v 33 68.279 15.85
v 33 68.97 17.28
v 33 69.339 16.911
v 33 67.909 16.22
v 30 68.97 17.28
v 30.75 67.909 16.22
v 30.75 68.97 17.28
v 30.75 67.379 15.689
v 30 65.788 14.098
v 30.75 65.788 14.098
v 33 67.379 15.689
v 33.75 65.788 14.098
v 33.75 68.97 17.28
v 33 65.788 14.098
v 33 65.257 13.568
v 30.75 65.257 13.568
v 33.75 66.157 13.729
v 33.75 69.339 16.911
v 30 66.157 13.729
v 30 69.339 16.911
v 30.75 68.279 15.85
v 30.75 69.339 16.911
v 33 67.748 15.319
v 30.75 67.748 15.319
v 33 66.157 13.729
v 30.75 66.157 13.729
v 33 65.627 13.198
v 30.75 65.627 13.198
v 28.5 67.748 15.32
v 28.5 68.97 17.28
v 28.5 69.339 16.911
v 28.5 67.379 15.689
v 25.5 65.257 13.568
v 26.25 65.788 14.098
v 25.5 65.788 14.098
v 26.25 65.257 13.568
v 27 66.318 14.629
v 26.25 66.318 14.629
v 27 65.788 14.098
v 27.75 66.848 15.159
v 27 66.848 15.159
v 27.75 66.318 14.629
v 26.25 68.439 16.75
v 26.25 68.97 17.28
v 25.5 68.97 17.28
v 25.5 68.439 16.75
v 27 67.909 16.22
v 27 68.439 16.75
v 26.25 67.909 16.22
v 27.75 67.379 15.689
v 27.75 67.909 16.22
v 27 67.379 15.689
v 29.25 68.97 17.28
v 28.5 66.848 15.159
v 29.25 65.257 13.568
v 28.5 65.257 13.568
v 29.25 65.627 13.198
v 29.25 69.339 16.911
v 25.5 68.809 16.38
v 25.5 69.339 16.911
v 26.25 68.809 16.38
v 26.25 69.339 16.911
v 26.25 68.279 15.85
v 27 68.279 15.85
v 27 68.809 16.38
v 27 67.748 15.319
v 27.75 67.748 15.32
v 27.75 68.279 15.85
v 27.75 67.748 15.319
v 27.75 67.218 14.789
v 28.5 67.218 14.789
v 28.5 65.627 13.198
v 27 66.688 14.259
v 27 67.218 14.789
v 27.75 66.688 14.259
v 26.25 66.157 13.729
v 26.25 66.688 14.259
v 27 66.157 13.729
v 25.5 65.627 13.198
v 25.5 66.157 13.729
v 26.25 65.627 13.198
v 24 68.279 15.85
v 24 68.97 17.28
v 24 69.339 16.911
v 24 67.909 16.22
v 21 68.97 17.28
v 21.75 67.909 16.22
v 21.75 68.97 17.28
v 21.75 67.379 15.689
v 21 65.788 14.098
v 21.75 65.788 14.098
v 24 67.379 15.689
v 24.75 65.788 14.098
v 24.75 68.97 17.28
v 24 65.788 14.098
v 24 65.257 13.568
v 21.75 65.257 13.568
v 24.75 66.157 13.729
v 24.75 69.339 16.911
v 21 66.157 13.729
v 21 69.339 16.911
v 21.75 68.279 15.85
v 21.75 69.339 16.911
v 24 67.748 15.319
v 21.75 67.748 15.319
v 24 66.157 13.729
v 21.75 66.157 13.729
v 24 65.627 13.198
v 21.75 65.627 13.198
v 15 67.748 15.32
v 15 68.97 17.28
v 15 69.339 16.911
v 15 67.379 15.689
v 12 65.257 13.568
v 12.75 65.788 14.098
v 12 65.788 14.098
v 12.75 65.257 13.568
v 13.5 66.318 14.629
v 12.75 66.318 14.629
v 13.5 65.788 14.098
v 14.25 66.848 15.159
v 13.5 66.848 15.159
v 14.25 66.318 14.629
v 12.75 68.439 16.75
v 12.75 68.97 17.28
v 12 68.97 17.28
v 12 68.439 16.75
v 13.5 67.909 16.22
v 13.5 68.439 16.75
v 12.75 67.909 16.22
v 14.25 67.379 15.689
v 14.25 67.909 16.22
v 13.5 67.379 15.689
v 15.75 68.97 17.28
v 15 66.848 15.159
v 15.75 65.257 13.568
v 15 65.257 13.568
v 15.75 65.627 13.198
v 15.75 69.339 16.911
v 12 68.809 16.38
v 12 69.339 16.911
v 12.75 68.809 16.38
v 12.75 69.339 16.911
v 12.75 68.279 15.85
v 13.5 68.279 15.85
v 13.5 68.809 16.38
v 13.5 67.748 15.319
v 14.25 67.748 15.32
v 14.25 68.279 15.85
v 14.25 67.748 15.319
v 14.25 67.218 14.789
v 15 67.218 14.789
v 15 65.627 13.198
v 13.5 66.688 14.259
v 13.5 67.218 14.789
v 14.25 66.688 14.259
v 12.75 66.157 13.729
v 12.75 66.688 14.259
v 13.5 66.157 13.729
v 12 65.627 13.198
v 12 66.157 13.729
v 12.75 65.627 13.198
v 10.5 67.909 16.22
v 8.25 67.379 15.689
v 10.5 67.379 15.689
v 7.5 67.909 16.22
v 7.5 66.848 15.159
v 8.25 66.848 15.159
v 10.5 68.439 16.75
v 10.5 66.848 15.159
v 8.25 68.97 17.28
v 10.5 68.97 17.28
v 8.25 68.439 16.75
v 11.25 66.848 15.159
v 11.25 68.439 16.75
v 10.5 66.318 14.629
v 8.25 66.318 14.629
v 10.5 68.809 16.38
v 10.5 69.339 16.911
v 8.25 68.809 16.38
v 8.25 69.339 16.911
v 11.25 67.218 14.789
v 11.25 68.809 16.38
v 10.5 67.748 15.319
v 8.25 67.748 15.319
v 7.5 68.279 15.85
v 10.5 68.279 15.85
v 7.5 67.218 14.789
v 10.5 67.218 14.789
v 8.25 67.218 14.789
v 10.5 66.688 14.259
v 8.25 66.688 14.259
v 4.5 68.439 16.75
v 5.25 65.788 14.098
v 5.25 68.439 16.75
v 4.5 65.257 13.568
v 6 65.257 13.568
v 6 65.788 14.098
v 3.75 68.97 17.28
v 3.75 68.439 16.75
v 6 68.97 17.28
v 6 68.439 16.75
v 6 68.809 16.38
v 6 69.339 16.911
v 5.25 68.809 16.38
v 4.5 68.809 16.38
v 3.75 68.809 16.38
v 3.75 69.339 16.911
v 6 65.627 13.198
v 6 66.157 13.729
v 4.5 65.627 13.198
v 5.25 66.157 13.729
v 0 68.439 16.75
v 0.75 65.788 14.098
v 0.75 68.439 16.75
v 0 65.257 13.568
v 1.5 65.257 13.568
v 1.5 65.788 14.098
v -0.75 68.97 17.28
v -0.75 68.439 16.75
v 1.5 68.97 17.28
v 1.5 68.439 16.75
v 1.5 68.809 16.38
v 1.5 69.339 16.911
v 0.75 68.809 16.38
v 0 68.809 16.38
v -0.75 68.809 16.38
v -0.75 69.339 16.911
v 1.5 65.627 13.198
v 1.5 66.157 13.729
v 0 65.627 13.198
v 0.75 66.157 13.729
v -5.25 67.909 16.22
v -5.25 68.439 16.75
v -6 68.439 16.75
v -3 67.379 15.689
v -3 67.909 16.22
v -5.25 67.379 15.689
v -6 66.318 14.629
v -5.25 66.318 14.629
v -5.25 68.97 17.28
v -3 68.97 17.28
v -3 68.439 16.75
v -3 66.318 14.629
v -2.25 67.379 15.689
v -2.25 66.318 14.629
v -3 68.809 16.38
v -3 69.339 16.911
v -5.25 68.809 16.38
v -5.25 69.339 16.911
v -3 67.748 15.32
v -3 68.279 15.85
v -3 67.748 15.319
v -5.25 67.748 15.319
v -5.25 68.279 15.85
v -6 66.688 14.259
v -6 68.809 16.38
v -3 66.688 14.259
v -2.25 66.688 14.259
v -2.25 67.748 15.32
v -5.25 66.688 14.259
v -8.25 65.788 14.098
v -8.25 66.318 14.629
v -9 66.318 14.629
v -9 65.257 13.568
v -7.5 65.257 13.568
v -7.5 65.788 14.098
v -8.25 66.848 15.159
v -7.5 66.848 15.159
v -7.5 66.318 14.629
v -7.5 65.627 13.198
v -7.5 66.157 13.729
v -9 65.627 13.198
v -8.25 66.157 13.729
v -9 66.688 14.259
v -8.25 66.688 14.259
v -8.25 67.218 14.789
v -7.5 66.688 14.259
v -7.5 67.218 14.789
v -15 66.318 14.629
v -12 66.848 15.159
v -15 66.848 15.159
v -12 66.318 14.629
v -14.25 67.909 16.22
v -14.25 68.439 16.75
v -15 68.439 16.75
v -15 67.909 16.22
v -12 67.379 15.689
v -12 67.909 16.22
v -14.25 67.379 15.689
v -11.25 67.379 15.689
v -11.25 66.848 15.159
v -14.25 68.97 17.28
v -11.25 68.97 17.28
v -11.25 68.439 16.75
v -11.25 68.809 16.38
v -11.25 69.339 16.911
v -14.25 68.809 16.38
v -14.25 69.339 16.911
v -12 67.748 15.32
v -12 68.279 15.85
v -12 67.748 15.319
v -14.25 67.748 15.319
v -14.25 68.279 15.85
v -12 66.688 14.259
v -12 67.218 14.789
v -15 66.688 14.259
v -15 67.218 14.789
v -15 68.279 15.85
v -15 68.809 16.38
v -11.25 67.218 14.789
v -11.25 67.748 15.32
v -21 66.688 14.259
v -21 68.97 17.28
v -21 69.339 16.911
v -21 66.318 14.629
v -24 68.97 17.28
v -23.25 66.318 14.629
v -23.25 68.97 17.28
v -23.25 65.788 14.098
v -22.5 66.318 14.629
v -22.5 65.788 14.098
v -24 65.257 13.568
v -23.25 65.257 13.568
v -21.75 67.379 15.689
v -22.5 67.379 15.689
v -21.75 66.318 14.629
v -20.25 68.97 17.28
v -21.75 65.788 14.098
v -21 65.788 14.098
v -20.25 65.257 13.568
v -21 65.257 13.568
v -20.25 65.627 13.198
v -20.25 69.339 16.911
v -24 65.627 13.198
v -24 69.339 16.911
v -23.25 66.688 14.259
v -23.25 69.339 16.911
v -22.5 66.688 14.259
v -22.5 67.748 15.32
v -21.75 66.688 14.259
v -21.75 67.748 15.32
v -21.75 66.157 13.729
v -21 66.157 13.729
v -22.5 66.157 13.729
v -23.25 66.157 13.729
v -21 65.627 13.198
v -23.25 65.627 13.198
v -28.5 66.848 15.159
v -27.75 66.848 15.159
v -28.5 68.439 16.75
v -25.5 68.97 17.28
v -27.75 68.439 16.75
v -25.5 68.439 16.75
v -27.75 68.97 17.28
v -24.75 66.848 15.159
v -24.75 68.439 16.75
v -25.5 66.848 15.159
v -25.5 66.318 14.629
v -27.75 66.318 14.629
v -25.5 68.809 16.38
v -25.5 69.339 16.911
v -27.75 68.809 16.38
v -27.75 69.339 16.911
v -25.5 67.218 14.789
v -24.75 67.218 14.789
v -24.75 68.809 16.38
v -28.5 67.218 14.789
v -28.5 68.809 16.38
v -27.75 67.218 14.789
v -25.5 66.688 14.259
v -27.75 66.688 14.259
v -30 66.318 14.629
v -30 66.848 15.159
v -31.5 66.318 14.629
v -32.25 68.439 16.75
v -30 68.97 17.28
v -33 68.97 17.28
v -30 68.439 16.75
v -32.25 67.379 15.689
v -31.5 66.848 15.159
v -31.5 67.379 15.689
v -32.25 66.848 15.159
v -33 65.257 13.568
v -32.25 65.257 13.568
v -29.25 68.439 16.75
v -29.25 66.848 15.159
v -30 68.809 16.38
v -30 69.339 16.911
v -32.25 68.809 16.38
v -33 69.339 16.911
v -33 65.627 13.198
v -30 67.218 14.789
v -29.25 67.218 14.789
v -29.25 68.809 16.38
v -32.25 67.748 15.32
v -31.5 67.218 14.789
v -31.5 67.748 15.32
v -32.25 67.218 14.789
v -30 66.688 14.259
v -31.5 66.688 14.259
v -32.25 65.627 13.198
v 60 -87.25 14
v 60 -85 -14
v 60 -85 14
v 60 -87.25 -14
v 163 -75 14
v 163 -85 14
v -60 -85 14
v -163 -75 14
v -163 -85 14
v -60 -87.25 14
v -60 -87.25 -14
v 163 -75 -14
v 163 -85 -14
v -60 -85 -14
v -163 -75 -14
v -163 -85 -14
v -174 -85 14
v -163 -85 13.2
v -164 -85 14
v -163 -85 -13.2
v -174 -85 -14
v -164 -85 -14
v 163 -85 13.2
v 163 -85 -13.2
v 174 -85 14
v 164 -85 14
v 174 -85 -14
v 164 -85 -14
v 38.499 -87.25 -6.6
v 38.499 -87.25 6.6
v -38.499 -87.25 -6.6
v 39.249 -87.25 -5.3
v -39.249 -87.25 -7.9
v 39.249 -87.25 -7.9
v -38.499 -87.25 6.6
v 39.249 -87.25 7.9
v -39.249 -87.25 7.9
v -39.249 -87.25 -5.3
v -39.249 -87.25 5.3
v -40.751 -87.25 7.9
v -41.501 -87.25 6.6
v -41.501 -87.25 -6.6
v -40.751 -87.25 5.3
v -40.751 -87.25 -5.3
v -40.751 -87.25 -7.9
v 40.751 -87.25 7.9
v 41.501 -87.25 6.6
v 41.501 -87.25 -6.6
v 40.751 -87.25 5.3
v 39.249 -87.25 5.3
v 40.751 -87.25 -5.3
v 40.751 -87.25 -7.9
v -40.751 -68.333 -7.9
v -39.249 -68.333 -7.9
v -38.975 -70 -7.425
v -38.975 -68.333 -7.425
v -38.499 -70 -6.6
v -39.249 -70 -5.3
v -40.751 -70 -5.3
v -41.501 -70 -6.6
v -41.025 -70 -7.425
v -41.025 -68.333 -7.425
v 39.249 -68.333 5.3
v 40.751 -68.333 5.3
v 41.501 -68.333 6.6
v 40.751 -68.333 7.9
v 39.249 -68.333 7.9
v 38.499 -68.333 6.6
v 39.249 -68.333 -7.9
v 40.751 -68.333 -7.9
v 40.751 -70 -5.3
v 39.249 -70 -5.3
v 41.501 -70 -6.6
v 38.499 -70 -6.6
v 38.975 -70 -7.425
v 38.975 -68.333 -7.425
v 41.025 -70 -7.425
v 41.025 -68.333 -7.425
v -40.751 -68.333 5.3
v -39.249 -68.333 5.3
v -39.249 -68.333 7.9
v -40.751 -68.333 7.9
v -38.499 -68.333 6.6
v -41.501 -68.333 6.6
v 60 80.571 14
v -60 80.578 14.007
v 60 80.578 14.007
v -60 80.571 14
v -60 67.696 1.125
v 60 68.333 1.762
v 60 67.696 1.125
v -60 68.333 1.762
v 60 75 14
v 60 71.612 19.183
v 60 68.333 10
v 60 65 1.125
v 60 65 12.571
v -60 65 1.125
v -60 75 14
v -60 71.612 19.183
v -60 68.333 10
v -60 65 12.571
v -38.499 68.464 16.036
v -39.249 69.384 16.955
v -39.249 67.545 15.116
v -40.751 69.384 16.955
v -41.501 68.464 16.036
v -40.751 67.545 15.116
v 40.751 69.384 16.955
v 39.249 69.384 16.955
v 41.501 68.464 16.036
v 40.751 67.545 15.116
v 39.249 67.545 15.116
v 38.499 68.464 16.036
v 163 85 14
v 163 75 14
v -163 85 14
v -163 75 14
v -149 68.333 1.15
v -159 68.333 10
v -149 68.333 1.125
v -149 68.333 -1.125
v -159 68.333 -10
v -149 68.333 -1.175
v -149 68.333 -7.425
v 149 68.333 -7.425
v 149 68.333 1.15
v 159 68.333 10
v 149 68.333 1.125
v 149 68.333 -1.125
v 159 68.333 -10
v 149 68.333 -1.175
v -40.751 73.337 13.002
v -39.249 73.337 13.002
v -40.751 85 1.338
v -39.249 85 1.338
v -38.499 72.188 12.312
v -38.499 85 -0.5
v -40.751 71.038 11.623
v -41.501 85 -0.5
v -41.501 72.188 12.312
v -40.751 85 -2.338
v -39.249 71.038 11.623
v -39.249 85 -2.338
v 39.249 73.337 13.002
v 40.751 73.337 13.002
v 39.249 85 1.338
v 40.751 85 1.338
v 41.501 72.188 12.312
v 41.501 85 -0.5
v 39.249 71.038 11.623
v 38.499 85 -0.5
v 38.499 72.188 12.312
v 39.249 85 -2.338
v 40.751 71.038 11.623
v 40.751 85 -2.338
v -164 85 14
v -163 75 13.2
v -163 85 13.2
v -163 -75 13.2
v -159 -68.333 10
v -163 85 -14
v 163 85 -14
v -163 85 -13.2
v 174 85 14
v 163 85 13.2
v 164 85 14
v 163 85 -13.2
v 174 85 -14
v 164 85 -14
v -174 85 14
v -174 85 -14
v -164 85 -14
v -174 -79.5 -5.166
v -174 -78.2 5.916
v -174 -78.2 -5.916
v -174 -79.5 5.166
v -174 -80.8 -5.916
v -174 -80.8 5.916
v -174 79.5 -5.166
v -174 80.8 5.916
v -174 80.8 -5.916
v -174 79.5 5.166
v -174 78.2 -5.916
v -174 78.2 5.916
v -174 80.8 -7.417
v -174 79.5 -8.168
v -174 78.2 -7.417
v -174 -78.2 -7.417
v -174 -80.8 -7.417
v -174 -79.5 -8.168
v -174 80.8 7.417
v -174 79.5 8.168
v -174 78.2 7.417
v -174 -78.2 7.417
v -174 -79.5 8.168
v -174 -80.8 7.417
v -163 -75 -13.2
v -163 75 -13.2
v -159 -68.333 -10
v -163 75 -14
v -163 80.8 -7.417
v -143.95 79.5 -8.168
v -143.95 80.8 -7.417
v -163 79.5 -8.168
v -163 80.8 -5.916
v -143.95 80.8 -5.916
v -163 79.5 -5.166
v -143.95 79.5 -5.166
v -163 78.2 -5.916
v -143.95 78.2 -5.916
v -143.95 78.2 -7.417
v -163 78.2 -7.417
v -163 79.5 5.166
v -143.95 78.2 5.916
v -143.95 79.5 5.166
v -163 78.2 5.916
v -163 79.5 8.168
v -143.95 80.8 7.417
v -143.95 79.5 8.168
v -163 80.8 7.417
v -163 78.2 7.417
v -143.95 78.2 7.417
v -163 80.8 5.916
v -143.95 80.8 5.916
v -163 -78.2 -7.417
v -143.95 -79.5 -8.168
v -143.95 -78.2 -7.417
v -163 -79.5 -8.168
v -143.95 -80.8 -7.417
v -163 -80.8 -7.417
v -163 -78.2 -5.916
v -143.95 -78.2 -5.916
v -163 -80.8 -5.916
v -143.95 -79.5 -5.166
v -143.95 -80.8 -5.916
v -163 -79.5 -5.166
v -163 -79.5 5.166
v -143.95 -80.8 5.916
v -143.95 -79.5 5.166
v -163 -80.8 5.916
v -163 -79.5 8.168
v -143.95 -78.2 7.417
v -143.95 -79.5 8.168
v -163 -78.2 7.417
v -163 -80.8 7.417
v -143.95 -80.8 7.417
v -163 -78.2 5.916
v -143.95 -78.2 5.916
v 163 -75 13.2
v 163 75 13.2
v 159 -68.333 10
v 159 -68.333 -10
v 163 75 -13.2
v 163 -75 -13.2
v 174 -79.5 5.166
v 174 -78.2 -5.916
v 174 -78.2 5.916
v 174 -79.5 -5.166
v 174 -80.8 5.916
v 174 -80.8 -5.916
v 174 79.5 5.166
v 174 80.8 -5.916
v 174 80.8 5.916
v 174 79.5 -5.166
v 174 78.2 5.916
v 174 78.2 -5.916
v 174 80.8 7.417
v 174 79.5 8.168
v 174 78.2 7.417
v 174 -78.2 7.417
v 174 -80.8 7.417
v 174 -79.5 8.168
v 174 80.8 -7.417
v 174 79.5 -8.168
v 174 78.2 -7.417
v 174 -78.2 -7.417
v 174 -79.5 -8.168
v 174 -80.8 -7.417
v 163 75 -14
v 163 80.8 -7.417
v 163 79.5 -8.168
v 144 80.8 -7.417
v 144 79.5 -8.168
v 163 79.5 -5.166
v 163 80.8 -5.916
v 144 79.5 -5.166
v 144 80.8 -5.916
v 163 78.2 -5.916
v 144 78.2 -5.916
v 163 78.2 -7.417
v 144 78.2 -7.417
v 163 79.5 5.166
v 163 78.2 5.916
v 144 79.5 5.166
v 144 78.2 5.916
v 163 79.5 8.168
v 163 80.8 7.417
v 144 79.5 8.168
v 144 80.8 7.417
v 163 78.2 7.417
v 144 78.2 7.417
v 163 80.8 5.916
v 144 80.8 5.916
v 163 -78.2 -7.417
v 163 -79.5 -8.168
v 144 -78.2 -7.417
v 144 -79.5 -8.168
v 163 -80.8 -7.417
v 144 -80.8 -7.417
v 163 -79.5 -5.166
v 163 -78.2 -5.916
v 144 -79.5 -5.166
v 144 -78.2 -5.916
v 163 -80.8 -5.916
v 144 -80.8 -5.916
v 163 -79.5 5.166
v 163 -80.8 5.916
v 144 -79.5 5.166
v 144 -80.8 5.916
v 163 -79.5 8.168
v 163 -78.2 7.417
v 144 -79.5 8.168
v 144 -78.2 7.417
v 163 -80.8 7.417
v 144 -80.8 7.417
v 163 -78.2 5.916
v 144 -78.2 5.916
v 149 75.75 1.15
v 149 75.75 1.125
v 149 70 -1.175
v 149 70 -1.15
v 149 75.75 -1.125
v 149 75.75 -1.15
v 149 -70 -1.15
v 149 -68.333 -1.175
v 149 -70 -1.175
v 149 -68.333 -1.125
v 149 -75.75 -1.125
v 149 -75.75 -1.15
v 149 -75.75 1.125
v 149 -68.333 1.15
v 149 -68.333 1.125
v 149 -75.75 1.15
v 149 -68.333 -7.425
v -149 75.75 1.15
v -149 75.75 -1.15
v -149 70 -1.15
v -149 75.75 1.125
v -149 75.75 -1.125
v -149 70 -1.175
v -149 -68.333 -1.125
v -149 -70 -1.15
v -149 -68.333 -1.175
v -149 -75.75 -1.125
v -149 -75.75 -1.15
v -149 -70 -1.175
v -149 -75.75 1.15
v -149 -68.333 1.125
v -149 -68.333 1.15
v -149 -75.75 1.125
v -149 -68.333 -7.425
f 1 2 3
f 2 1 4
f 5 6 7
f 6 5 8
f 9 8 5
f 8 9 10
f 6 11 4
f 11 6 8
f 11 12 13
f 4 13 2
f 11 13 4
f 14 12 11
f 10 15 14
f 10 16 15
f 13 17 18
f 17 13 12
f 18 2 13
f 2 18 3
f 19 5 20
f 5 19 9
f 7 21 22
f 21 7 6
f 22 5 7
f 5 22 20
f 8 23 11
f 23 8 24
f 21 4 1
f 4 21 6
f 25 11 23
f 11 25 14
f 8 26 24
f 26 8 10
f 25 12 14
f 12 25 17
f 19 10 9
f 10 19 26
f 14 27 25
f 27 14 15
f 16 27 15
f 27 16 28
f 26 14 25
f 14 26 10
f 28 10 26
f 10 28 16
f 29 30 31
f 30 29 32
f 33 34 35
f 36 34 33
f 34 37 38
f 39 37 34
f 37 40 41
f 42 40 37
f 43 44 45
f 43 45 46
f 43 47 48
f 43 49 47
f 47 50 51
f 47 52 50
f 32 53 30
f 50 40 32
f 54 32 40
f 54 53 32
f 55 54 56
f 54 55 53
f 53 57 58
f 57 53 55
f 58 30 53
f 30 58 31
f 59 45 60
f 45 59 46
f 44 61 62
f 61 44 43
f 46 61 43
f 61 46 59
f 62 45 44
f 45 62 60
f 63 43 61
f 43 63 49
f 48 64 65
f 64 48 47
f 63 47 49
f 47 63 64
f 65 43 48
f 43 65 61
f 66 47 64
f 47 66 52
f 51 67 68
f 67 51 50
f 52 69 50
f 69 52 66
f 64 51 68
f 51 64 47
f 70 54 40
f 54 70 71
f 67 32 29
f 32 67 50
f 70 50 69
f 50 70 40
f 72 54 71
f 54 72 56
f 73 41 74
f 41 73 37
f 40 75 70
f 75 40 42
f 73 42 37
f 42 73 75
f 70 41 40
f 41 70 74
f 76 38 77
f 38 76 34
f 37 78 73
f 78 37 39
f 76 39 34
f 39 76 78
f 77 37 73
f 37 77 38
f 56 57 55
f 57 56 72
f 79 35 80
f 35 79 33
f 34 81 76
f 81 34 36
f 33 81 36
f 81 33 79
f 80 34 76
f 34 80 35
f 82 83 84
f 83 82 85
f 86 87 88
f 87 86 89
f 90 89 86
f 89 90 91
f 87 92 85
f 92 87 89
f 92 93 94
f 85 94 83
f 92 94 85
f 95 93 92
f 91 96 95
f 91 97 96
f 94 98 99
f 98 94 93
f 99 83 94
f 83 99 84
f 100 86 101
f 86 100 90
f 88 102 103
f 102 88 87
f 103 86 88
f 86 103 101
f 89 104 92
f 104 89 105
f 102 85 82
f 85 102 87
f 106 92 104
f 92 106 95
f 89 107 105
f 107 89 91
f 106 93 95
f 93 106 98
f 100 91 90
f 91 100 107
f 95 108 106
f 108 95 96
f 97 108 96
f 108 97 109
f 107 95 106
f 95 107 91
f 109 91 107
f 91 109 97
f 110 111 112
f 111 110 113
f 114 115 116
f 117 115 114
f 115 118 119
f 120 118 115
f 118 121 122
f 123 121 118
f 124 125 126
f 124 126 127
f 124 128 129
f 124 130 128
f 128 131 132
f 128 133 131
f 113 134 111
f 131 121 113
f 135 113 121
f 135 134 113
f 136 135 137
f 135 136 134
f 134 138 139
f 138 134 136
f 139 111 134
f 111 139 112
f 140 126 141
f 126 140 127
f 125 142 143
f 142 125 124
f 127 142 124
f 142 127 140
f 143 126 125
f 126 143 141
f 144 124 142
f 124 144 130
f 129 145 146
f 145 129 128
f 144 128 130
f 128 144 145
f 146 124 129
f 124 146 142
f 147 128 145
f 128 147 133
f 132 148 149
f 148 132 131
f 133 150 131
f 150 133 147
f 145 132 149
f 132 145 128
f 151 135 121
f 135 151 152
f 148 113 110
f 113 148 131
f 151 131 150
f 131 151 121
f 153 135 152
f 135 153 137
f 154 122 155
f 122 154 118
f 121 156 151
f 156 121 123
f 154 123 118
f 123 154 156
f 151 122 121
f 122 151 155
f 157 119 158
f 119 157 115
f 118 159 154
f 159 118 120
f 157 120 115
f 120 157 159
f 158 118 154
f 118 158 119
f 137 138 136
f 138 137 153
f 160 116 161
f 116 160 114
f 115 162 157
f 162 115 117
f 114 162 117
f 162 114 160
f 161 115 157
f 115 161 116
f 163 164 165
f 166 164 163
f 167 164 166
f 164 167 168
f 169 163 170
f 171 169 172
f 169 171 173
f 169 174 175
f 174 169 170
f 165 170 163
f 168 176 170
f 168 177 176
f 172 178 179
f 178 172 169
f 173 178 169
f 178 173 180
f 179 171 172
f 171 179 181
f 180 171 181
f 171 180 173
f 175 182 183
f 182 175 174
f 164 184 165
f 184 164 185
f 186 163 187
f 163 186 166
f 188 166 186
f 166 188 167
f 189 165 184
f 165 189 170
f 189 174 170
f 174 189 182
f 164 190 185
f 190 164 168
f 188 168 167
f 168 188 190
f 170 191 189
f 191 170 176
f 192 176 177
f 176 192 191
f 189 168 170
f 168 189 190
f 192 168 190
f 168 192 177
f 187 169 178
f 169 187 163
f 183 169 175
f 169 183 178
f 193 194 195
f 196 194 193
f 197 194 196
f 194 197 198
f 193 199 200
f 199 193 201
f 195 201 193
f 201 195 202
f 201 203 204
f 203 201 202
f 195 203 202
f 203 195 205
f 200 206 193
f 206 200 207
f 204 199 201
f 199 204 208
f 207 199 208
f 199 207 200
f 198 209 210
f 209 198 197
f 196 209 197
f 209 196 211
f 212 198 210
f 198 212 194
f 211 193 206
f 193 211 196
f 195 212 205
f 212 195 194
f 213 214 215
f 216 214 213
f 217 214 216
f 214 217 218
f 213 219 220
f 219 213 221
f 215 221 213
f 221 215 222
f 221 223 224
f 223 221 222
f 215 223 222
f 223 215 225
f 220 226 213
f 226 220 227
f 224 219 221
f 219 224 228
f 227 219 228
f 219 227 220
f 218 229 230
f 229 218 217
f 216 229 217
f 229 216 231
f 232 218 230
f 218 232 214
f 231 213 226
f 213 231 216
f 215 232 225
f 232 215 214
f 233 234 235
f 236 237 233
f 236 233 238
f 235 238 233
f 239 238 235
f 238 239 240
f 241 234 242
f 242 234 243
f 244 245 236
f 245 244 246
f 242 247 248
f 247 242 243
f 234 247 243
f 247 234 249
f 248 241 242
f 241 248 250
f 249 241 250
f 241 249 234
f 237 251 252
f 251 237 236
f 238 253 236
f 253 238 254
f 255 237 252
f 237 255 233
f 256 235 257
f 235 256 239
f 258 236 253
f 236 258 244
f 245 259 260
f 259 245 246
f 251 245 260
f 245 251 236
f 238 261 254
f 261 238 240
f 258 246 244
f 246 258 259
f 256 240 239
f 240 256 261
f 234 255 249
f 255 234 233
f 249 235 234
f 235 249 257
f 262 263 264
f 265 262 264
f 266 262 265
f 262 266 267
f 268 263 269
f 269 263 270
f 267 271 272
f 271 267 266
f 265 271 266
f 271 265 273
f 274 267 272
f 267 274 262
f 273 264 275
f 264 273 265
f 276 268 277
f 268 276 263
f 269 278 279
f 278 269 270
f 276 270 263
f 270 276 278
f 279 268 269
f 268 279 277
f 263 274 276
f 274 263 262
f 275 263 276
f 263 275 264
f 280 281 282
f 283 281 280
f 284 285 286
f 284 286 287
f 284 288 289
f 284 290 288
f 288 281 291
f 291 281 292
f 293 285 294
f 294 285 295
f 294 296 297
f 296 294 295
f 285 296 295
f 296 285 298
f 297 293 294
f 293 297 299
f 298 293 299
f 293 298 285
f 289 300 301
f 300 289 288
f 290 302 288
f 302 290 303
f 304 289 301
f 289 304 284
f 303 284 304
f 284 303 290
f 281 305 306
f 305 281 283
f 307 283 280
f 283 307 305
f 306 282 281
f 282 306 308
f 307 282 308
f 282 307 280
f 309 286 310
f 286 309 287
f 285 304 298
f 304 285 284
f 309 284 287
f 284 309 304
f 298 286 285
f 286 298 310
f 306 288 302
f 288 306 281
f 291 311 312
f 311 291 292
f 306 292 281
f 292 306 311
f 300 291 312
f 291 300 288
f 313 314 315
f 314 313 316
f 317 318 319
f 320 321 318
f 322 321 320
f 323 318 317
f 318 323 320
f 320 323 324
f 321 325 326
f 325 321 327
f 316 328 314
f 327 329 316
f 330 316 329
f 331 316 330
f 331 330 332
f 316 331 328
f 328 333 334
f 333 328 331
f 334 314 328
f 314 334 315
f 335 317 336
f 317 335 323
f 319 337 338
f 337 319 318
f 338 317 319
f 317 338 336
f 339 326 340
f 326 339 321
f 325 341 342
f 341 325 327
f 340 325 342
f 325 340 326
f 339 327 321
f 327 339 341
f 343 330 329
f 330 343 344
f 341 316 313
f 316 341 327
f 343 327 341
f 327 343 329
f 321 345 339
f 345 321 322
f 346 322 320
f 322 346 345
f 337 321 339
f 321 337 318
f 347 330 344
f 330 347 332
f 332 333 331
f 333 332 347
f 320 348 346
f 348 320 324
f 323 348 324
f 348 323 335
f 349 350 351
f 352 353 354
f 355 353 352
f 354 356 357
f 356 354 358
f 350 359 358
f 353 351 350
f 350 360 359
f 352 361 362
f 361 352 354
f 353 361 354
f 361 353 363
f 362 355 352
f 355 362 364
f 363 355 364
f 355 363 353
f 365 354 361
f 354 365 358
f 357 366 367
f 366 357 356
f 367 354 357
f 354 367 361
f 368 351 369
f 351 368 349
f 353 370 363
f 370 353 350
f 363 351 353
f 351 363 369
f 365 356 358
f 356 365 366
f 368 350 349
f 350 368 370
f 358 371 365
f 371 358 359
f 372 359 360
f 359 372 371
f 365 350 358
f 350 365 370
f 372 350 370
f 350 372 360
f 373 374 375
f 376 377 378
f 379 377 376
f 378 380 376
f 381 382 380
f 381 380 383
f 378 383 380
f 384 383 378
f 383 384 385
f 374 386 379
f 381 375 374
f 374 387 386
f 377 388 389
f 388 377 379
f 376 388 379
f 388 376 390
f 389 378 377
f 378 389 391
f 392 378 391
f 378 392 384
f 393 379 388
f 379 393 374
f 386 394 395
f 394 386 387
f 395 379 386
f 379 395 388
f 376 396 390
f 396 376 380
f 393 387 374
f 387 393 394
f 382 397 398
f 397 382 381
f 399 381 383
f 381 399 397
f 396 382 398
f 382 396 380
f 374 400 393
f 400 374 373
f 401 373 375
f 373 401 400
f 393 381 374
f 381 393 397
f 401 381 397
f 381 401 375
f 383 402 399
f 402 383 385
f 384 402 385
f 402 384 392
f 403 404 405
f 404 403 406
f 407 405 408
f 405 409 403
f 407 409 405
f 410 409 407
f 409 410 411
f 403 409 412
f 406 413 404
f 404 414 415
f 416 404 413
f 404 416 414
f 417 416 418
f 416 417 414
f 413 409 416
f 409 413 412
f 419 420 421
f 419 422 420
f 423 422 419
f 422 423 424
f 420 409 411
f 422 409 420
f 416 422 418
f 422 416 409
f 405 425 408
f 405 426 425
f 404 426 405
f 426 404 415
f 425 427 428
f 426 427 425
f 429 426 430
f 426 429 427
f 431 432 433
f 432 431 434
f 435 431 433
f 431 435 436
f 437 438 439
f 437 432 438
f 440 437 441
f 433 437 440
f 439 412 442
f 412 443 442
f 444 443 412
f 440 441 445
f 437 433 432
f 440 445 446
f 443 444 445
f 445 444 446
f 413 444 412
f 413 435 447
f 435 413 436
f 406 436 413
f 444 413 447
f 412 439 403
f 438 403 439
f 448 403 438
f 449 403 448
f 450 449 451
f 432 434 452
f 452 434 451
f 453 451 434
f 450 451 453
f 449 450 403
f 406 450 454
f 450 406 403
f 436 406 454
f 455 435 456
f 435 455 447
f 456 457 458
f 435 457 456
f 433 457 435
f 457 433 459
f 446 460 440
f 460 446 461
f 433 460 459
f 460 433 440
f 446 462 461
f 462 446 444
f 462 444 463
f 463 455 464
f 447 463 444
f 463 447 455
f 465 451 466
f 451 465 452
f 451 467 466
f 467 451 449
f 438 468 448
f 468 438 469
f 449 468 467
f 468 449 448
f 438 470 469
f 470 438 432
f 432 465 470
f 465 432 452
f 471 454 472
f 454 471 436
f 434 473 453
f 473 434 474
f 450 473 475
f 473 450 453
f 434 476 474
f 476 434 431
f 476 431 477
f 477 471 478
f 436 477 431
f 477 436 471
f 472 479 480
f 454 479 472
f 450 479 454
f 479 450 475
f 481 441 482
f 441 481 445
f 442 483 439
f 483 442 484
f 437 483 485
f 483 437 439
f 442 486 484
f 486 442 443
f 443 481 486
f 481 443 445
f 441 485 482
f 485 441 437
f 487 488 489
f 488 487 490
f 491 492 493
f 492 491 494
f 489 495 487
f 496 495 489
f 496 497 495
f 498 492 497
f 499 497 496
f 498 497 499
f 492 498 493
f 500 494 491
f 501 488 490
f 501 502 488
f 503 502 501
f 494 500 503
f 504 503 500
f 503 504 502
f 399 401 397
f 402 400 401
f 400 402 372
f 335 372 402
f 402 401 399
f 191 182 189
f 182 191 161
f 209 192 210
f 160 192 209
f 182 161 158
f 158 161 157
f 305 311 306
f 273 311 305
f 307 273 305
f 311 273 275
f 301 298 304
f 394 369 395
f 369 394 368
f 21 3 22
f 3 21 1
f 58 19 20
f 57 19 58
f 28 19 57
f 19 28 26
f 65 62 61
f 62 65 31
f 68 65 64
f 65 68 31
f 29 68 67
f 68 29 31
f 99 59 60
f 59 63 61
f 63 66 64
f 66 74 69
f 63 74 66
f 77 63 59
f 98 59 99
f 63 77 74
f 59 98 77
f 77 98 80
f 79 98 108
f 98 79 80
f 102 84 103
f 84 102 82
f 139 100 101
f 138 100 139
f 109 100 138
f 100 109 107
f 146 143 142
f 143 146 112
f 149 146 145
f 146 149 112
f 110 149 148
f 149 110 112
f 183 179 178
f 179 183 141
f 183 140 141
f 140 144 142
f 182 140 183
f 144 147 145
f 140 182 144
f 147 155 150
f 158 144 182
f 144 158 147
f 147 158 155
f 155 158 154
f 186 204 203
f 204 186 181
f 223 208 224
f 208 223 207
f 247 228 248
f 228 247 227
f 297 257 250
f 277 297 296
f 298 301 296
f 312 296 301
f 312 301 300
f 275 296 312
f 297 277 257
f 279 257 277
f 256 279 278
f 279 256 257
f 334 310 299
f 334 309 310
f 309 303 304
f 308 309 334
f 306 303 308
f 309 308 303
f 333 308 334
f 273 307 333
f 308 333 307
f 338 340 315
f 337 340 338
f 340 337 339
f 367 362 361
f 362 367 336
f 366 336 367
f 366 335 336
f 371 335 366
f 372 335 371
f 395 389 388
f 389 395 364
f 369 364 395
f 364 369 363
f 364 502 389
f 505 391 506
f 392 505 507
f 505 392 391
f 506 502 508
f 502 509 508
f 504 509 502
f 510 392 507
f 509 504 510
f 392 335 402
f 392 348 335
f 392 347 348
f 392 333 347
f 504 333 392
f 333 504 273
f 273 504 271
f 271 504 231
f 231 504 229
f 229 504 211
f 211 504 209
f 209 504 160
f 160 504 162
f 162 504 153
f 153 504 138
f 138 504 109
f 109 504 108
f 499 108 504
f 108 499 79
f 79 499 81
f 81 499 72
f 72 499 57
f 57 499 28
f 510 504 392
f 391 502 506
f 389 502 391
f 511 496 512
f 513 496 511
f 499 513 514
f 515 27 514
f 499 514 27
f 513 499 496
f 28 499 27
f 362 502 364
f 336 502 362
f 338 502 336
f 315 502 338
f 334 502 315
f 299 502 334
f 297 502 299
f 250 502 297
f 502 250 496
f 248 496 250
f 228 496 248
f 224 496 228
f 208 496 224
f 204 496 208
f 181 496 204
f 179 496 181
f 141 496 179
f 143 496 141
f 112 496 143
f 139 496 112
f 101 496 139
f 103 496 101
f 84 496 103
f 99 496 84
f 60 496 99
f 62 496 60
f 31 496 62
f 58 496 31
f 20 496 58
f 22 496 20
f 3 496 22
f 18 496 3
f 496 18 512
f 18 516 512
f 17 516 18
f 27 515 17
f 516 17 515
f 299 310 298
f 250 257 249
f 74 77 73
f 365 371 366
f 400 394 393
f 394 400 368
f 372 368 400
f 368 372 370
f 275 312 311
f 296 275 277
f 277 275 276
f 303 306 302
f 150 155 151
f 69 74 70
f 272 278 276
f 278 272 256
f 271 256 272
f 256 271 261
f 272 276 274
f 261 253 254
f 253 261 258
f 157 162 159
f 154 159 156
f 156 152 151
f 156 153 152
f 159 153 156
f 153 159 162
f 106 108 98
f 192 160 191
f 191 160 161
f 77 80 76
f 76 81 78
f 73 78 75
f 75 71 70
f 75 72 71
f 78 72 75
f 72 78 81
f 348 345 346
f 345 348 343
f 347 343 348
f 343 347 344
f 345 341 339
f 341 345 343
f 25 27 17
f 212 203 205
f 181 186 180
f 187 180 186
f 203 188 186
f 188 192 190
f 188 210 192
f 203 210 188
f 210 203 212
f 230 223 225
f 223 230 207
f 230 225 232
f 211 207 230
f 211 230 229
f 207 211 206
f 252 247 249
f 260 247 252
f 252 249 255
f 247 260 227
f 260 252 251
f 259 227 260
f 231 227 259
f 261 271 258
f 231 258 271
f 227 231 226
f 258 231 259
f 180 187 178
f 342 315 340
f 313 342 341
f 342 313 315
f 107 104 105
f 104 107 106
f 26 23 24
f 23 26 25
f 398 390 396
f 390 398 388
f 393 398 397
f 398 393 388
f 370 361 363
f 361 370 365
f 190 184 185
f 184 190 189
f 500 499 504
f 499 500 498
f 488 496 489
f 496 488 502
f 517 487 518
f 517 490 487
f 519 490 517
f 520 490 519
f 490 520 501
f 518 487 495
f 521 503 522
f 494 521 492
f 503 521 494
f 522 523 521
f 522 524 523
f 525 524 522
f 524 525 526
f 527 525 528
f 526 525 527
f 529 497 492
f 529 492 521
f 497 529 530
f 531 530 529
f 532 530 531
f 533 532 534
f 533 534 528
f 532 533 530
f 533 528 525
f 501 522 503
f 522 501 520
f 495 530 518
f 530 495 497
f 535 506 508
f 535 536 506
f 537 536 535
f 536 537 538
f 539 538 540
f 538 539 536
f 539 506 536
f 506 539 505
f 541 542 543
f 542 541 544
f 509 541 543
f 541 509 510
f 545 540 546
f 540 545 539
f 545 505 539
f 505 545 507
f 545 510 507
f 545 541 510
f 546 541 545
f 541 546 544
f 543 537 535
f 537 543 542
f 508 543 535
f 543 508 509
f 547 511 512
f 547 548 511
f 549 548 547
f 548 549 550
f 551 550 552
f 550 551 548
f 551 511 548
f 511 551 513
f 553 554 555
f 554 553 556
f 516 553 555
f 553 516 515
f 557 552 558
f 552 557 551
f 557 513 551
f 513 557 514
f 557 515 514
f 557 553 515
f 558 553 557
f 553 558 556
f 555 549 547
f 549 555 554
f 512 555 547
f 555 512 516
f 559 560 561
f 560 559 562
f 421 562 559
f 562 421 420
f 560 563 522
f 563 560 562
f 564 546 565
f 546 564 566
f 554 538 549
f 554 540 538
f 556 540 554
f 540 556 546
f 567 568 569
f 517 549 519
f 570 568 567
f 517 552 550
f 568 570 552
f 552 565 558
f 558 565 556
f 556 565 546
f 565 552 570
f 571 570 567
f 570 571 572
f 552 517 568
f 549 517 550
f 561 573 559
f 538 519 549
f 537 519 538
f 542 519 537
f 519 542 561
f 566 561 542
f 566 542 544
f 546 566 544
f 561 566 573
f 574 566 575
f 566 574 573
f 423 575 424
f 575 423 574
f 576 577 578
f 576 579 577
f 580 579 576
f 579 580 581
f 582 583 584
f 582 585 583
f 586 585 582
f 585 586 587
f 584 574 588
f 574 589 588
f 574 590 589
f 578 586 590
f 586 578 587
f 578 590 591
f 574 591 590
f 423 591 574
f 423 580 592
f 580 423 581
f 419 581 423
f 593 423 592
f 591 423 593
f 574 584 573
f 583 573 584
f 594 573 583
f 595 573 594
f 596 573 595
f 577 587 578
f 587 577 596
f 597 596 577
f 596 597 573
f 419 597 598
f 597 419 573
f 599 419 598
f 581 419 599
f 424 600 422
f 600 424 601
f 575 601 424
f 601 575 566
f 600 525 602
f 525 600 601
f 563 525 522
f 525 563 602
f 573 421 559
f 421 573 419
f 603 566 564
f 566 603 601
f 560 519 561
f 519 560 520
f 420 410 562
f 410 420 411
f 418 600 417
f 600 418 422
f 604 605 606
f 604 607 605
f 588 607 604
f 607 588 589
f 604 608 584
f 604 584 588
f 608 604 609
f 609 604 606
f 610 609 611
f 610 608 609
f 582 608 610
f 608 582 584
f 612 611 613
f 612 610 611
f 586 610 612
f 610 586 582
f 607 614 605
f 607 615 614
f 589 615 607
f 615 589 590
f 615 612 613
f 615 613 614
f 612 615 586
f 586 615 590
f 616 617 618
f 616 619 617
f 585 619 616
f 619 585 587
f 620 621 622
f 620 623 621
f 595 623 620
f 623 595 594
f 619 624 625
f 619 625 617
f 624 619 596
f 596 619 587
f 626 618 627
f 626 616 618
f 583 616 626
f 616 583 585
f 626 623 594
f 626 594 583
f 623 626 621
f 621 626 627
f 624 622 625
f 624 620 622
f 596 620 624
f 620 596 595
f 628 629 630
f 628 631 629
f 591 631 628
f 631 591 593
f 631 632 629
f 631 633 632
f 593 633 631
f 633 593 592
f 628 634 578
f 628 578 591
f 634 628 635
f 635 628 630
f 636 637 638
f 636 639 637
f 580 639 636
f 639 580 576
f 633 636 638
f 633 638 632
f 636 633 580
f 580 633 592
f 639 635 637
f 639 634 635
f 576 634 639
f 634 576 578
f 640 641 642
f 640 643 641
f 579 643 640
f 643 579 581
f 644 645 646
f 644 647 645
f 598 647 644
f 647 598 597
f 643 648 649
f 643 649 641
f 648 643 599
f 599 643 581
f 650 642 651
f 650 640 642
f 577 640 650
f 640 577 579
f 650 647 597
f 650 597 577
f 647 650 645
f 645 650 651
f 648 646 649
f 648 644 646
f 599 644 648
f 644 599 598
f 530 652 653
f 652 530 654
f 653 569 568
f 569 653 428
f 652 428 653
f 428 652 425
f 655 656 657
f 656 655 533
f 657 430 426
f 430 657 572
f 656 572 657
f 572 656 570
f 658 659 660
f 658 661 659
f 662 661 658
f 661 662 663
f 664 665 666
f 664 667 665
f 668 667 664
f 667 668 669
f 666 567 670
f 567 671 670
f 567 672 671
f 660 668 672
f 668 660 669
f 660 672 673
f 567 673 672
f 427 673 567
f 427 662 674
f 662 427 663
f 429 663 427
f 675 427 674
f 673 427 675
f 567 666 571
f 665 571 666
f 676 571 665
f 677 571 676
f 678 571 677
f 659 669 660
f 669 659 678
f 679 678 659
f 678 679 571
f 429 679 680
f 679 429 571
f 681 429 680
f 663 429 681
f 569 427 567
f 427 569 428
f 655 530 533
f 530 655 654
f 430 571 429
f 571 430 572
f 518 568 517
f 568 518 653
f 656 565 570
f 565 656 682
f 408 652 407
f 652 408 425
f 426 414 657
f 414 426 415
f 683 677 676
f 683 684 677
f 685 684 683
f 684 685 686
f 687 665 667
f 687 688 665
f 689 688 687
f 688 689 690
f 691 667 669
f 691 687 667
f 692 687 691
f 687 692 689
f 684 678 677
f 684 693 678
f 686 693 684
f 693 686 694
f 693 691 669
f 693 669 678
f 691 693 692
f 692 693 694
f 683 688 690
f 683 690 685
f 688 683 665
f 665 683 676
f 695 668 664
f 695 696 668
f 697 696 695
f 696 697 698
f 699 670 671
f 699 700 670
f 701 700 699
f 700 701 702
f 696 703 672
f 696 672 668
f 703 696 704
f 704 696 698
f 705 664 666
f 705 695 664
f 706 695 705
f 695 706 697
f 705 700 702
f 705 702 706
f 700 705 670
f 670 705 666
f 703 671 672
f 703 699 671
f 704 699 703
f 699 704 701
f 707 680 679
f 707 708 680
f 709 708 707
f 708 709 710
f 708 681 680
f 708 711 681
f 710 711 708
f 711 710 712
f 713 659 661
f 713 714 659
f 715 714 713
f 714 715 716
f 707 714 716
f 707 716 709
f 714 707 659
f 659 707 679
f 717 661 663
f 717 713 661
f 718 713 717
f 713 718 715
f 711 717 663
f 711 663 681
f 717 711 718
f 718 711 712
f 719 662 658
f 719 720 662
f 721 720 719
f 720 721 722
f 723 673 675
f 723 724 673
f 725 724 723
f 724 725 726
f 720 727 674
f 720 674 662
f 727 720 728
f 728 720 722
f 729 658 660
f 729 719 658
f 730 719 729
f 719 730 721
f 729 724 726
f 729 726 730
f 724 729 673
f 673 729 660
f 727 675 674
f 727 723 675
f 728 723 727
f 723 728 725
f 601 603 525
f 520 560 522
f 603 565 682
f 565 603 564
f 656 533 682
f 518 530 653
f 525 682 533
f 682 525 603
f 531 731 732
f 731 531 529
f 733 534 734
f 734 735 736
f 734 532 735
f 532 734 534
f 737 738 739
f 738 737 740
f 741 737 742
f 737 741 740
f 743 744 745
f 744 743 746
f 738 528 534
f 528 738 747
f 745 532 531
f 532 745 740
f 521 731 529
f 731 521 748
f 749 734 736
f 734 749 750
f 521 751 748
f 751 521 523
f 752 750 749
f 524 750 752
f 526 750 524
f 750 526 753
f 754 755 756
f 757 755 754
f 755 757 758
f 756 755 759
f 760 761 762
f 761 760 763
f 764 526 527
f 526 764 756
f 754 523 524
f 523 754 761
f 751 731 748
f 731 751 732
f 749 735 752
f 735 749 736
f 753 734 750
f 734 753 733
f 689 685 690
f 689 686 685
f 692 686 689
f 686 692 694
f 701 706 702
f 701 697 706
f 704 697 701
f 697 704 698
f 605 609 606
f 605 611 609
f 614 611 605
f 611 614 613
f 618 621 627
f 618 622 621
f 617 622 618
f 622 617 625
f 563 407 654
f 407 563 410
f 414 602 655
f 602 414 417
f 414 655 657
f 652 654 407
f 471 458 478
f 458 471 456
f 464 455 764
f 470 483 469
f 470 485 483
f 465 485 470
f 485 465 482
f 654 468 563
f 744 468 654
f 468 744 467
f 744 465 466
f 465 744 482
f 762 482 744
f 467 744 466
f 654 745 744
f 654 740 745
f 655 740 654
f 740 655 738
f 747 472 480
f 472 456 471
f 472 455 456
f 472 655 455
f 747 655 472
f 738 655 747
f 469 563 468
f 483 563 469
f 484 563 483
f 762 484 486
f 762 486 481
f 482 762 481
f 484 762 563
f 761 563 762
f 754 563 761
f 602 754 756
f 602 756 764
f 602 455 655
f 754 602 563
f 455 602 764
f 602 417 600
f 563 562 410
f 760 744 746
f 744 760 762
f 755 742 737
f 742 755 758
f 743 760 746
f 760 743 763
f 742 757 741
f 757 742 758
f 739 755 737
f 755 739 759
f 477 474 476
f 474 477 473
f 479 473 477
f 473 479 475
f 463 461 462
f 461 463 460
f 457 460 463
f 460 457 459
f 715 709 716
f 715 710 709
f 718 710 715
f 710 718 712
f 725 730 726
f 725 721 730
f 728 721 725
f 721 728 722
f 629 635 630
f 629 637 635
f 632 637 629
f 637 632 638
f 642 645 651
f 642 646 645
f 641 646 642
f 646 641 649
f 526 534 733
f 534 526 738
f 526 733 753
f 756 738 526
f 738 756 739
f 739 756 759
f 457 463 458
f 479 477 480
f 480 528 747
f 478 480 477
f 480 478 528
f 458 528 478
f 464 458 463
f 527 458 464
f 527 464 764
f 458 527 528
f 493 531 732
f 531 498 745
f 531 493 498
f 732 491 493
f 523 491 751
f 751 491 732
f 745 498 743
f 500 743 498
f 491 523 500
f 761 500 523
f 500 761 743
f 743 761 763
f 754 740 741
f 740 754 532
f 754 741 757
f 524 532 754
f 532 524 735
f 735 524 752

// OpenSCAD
//How thick the backing for the display is
backingThickness=6.25;
//How tall the backing is
backingHeight=140;
//How wide the backing is, should be the same width as the plexiglass
backingWidth=298;
//How thick the Plexiglass you are working with is
plexiThickness=2.25;
//How tall the Plexiglass is
plexiHeight=151.5;
plexiWidth=backingWidth;
// Hole creation offset for bolt holes and such
holeCreationOffset=0.05;
//The size of the text on the object
textSize=.75;//[.5,.75,1]
//The text to display on the fliplock
locktext="AKA Kelly's Mod";
//How wide the faceplate is
facePlateWidth=120;
//How thick the base is
baseThickness=10;
//How tall the base is
baseHeight=20;
//The base offset size, this will affect the shouldered areas
baseOffset=8;
//How large the holes are, make it smaller then the screw radius to ensure self threading
boltHolesRadius=1.3;
//How long the hole for the bolts are
boltHoleLength=20;
//Howe large the bolthead is in height
screwHeadHeight=2.5;
//The radius of the bolthead
screwHeadRadius=2.8;
fakePlexi=true; //[true:false]
fakeBacking=true; //[true:false]
enableBracket=true; //[true:false]
enableBase=true; //[true:false]
enableBaseLeftSide=true; //[true:false]
enableBaseRightSide=true; //[true:false]
enableTop=true; //[true:false]
enableText=true; //[true:false]
enableScrewHoles=true; //[true:false]
enableFacePlate=true; //[true:false]
enableTopPlate=true; //[true:false]

 
module cylinder_outer(height,radius,fn){
   fudge = 1/cos(180/fn);
   cylinder(h=height,r=radius*fudge,$fn=fn);}
   
module cylinder_mid(height,radius,fn){
   fudge = (1+1/cos(180/fn))/2;
   cylinder(h=height,r=radius*fudge,$fn=fn);}
   
module holder(){
    stringlen=len(locktext);
    testlength=stringlen *textSize;
    //How wide the base is
    baseWidth=(backingWidth/2) + 10;
    overallThickness=backingThickness + plexiThickness;
    bracketThickness=((baseWidth * 2) - backingWidth) /2;
    bracketHeight=baseHeight;
    bracketWidth=(baseThickness * 3) + backingHeight;
    bracketOffset=bracketThickness/2;

        if (enableText){
             translate([testlength * 3 , baseWidth/2 - (baseThickness ) , baseThickness * 2 - (baseOffset/2) + (textSize )]) rotate(a=[-45,0,180])  scale([textSize,textSize,textSize]) drawtext(locktext);
        }
    
    
        if (enableTopPlate){
            difference(){
                translate([0, -bracketWidth/2 - (plexiThickness/2), 0]) cube([facePlateWidth, plexiThickness, baseHeight + baseOffset], center=true);
                translate([-(facePlateWidth / 3 ), -bracketWidth/2 + (boltHoleLength), -(baseHeight ) * .33]) rotate(a=[90,0,0]) cylinder_outer(boltHoleLength* 3 + holeCreationOffset,boltHolesRadius,6);
                translate([(facePlateWidth / 3 ), -bracketWidth/2 + (boltHoleLength), (baseHeight )  * .33]) rotate(a=[90,0,0]) cylinder_outer(boltHoleLength* 3 + holeCreationOffset,boltHolesRadius,6);

                translate([(facePlateWidth / 3 ), -bracketWidth/2 + (boltHoleLength), -(baseHeight ) * .33]) rotate(a=[90,0,0]) cylinder_outer(boltHoleLength* 3 + holeCreationOffset,boltHolesRadius,6);
                translate([-(facePlateWidth / 3 ), -bracketWidth/2 + (boltHoleLength), (baseHeight )  * .33]) rotate(a=[90,0,0]) cylinder_outer(boltHoleLength* 3 + holeCreationOffset,boltHolesRadius,6);
            }
    
        }
    

        if (enableFacePlate){
            difference(){
                translate([0, baseWidth/2, baseThickness * 2]) rotate(a=[-45,0,0])cube([facePlateWidth, baseThickness, 60], center=true);
                translate([0, 0, -50 ]) cube([plexiWidth, plexiHeight, 100], center=true);
                translate([0, 45, 0 ]) cube([plexiWidth, 40, 40], center=true);
                translate([0, bracketWidth/2.25, 40 ]) rotate(a=[60,0,0]) cube([plexiWidth, 40, 80], center=true);
                hull(){
                    translate([0, (backingHeight/2) + (baseThickness/3) , 0 ]) cube([baseWidth ,baseThickness , baseHeight], center=true);
                    translate([0, (backingHeight/2) + (baseThickness) , 0 ]) cube([baseWidth + baseOffset ,baseThickness , baseHeight + baseOffset], center=true);
                    }
    translate([-(facePlateWidth / 3 ), baseWidth/2 + baseThickness , -baseThickness/2  ]) rotate(a=[45,0,0]) cylinder_outer(boltHoleLength * 3 + holeCreationOffset,boltHolesRadius,6);
    translate([(facePlateWidth / 3 ), baseWidth/2 + baseThickness , -baseThickness/2 ]) rotate(a=[45,0,0]) cylinder_outer(boltHoleLength* 3 + holeCreationOffset,boltHolesRadius,6);
            }
        }
        
        if (fakeBacking){
            color([1,1,0]) translate([0, 0, -backingThickness - holeCreationOffset + (plexiThickness) - .25]) cube([backingWidth, backingHeight, backingThickness], center=true);
            
            }
        if (fakePlexi){
            color([1,0,1]) translate([0, 0, 0 ]) cube([plexiWidth, plexiHeight, plexiThickness], center=true);
            }

        if (enableBracket){
            difference(){
            hull() union() {
            translate([-baseWidth - bracketOffset , 0, 0]) cube([ bracketThickness, bracketWidth, bracketHeight], center=true);
            translate([-baseWidth - (bracketThickness /2) - bracketOffset, 0, 0]) cube([ bracketThickness, bracketWidth, bracketHeight + baseOffset], center=true);
            }
            hull() {
            translate([-baseWidth/2, (backingHeight/2) + (baseThickness/2) , 0 ]) cube([baseWidth ,baseThickness , baseHeight], center=true);
            translate([baseWidth/2, (backingHeight/2) + (baseThickness/2), 0 ]) cube([baseWidth ,baseThickness , baseHeight], center=true);
            translate([-baseWidth/2, (backingHeight/2) + (baseThickness) , 0 ]) cube([baseWidth + baseOffset ,baseThickness , baseHeight + baseOffset], center=true);
            translate([baseWidth/2, (backingHeight/2) + (baseThickness), 0 ]) cube([baseWidth + baseOffset ,baseThickness , baseHeight + baseOffset], center=true);

                }
                
            hull() {
            translate([baseWidth/2, -(backingHeight/2) - (baseThickness/2) , 0 ]) cube([baseWidth ,baseThickness , baseHeight], center=true);
            translate([-baseWidth/2, -(backingHeight/2) - (baseThickness/2), 0 ]) cube([baseWidth ,baseThickness , baseHeight], center=true);
            translate([baseWidth/2, -(backingHeight/2) - (baseThickness) , 0 ]) cube([baseWidth + baseOffset ,baseThickness , baseHeight + baseOffset], center=true);
            translate([-baseWidth/2, -(backingHeight/2) - (baseThickness), 0 ]) cube([baseWidth + baseOffset ,baseThickness , baseHeight + baseOffset], center=true);
            
                }
                
            rotate(a=[0,90,0]) translate([(baseHeight / 3), baseWidth/2, -baseWidth - boltHoleLength ]) cylinder_outer(boltHoleLength + holeCreationOffset,boltHolesRadius,6);
            rotate(a=[0,90,0]) translate([-(baseHeight / 3), baseWidth/2, -baseWidth - boltHoleLength ]) cylinder_outer(boltHoleLength + holeCreationOffset,boltHolesRadius,6);
            rotate(a=[0,90,0]) translate([(baseHeight / 3), -baseWidth/2, -baseWidth - boltHoleLength ]) cylinder_outer(boltHoleLength + holeCreationOffset,boltHolesRadius,6);
            rotate(a=[0,90,0]) translate([-(baseHeight / 3), -baseWidth/2, -baseWidth - boltHoleLength ]) cylinder_outer(boltHoleLength + holeCreationOffset,boltHolesRadius,6);
        }
        difference(){
                hull() union() {
            translate([baseWidth + bracketOffset, 0, 0]) cube([ bracketThickness, bracketWidth, bracketHeight], center=true);
            translate([baseWidth  + (bracketThickness /2) + bracketOffset, 0, 0]) cube([ bracketThickness, bracketWidth, bracketHeight + baseOffset], center=true);
                }
                hull() union() {
            translate([-baseWidth/2, (backingHeight/2) + (baseThickness/2) , 0 ]) cube([baseWidth ,baseThickness , baseHeight], center=true);
            translate([baseWidth/2, (backingHeight/2) + (baseThickness/2), 0 ]) cube([baseWidth ,baseThickness , baseHeight], center=true);
            translate([-baseWidth/2, (backingHeight/2) + (baseThickness) , 0 ]) cube([baseWidth + baseOffset ,baseThickness , baseHeight + baseOffset], center=true);
            translate([baseWidth/2, (backingHeight/2) + (baseThickness), 0 ]) cube([baseWidth + baseOffset ,baseThickness , baseHeight + baseOffset], center=true);
                                            
                }
                
                hull() union() {
            translate([baseWidth/2, -(backingHeight/2) - (baseThickness/2) , 0 ]) cube([baseWidth ,baseThickness , baseHeight], center=true);
            translate([-baseWidth/2, -(backingHeight/2) - (baseThickness/2), 0 ]) cube([baseWidth ,baseThickness , baseHeight], center=true);
            translate([baseWidth/2, -(backingHeight/2) - (baseThickness) , 0 ]) cube([baseWidth + baseOffset ,baseThickness , baseHeight + baseOffset], center=true);
            translate([-baseWidth/2, -(backingHeight/2) - (baseThickness), 0 ]) cube([baseWidth + baseOffset ,baseThickness , baseHeight + baseOffset], center=true);
            
                }
                
                rotate(a=[0,90,0]) translate([(baseHeight / 3), baseWidth/2, baseWidth ]) cylinder_outer(boltHoleLength + holeCreationOffset,boltHolesRadius,6);
                rotate(a=[0,90,0]) translate([-(baseHeight / 3), baseWidth/2, baseWidth ]) cylinder_outer(boltHoleLength + holeCreationOffset,boltHolesRadius,6);
                rotate(a=[0,90,0]) translate([(baseHeight / 3), -baseWidth/2, baseWidth ]) cylinder_outer(boltHoleLength + holeCreationOffset,boltHolesRadius,6);
                rotate(a=[0,90,0]) translate([-(baseHeight / 3), -baseWidth/2, baseWidth ]) cylinder_outer(boltHoleLength + holeCreationOffset,boltHolesRadius,6);
            }
        }   
        if (enableBase){
            
            difference(){
            hull() union() {
                if (enableBaseLeftSide){
            translate([-baseWidth/2, (backingHeight/2) + (baseThickness/3) , 0 ]) cube([baseWidth ,baseThickness , baseHeight], center=true);
                                translate([-baseWidth/2, (backingHeight/2) + (baseThickness) , 0 ]) cube([baseWidth + baseOffset ,baseThickness , baseHeight + baseOffset], center=true);
                    
                        

                }
                if (enableBaseRightSide){

            translate([baseWidth/2, (backingHeight/2) + (baseThickness), 0 ]) cube([baseWidth + baseOffset ,baseThickness , baseHeight + baseOffset], center=true);
                                translate([baseWidth/2, (backingHeight/2) + (baseThickness/3), 0 ]) cube([baseWidth ,baseThickness , baseHeight], center=true);

                }
                }
               cube([plexiWidth, plexiHeight, plexiThickness + holeCreationOffset], center=true); 
               translate([0, 0, -backingThickness  + (plexiThickness) - .25]) cube([backingWidth, backingHeight, backingThickness + holeCreationOffset], center=true);
            
                rotate(a=[0,90,0]) translate([(baseHeight / 3), baseWidth/2, baseWidth - (baseThickness * 1.5)]) cylinder_outer(boltHoleLength + holeCreationOffset,boltHolesRadius,6);
                rotate(a=[0,90,0]) translate([-(baseHeight / 3), baseWidth/2, baseWidth - (baseThickness * 1.5) ]) cylinder_outer(boltHoleLength + holeCreationOffset,boltHolesRadius,6);


                rotate(a=[0,90,0]) translate([(baseHeight / 3), baseWidth/2, -baseWidth - (boltHoleLength/4) ]) cylinder_outer(boltHoleLength + holeCreationOffset,boltHolesRadius,6);
                rotate(a=[0,90,0]) translate([-(baseHeight / 3), baseWidth/2, -baseWidth - (boltHoleLength/4) ]) cylinder_outer(boltHoleLength + holeCreationOffset,boltHolesRadius,6);

                translate([-(facePlateWidth / 3 ), baseWidth/2 + baseThickness , -baseThickness/2  ]) rotate(a=[45,0,0]) cylinder_outer(boltHoleLength * 3 + holeCreationOffset,boltHolesRadius,6);
                translate([(facePlateWidth / 3 ), baseWidth/2 + baseThickness , -baseThickness/2 ]) rotate(a=[45,0,0]) cylinder_outer(boltHoleLength* 3 + holeCreationOffset,boltHolesRadius,6);

                
                }
            } 
          
        if (enableTop){
            difference(){
            hull() union() {
                if (enableBaseRightSide){
            translate([baseWidth/2, -(backingHeight/2) - (baseThickness/3) , 0 ]) cube([baseWidth ,baseThickness , baseHeight], center=true);
                        translate([baseWidth/2, -(backingHeight/2) - (baseThickness) , 0 ]) cube([baseWidth + baseOffset ,baseThickness , baseHeight + baseOffset], center=true);
                    }
            if (enableBaseLeftSide){

            translate([-baseWidth/2, -(backingHeight/2) - (baseThickness), 0 ]) cube([baseWidth + baseOffset ,baseThickness , baseHeight + baseOffset], center=true);
                translate([-baseWidth/2, -(backingHeight/2) - (baseThickness/3), 0 ]) cube([baseWidth ,baseThickness , baseHeight], center=true);
            }
            
                }
                cube([plexiWidth, plexiHeight, plexiThickness + holeCreationOffset], center=true); 
                translate([0, 0, -backingThickness  + (plexiThickness) - .25]) cube([backingWidth, backingHeight, backingThickness + holeCreationOffset], center=true);

                rotate(a=[0,90,0]) translate([(baseHeight / 3), -baseWidth/2, baseWidth - (baseThickness * 1.5) ]) cylinder_outer(boltHoleLength + holeCreationOffset,boltHolesRadius,6);
                rotate(a=[0,90,0]) translate([-(baseHeight / 3), -baseWidth/2, baseWidth - (baseThickness * 1.5) ]) cylinder_outer(boltHoleLength + holeCreationOffset,boltHolesRadius,6);
                rotate(a=[0,90,0]) translate([(baseHeight / 3), -baseWidth/2, -baseWidth - (boltHoleLength/4) ]) cylinder_outer(boltHoleLength + holeCreationOffset,boltHolesRadius,6);
                rotate(a=[0,90,0]) translate([-(baseHeight / 3), -baseWidth/2, -baseWidth - (boltHoleLength/4) ]) cylinder_outer(boltHoleLength + holeCreationOffset,boltHolesRadius,6);
                
                    translate([(facePlateWidth / 3 ), -bracketWidth/2 + (boltHoleLength), (baseHeight )  * .33]) rotate(a=[90,0,0]) cylinder_outer(boltHoleLength* 3 + holeCreationOffset,boltHolesRadius,6);
    
    translate([(facePlateWidth / 3 ), -bracketWidth/2 + (boltHoleLength), -(baseHeight ) * .33]) rotate(a=[90,0,0]) cylinder_outer(boltHoleLength* 3 + holeCreationOffset,boltHolesRadius,6);
                
                    translate([-(facePlateWidth / 3 ), -bracketWidth/2 + (boltHoleLength), -(baseHeight ) * .33]) rotate(a=[90,0,0]) cylinder_outer(boltHoleLength* 3 + holeCreationOffset,boltHolesRadius,6);

    translate([-(facePlateWidth / 3 ), -bracketWidth/2 + (boltHoleLength), (baseHeight )  * .33]) rotate(a=[90,0,0]) cylinder_outer(boltHoleLength* 3 + holeCreationOffset,boltHolesRadius,6);
                
                }
            }   
            
        
}



module drawtext(text) {
	//Characters
	chars = " !\"#$%&'()*+,-./0123456789:;<=>?@ABCDEFGHIJKLMNOPQRSTUVWXYZ[\\]^_`abcdefghijklmnopqrstuvwxyz{|}";

	//Chracter table defining 5x7 characters
	//Adapted from: http://www.geocities.com/dinceraydin/djlcdsim/chartable.js
	char_table = [ [ 0, 0, 0, 0, 0, 0, 0],
                  [ 4, 0, 4, 4, 4, 4, 4],
                  [ 0, 0, 0, 0,10,10,10],
                  [10,10,31,10,31,10,10],
                  [ 4,30, 5,14,20,15, 4],
                  [ 3,19, 8, 4, 2,25,24],
                  [13,18,21, 8,20,18,12],
                  [ 0, 0, 0, 0, 8, 4,12],
                  [ 2, 4, 8, 8, 8, 4, 2],
                  [ 8, 4, 2, 2, 2, 4, 8],
                  [ 0, 4,21,14,21, 4, 0],
                  [ 0, 4, 4,31, 4, 4, 0],
                  [ 8, 4,12, 0, 0, 0, 0],
                  [ 0, 0, 0,31, 0, 0, 0],
                  [12,12, 0, 0, 0, 0, 0],
                  [ 0,16, 8, 4, 2, 1, 0],
                  [14,17,25,21,19,17,14],
                  [14, 4, 4, 4, 4,12, 4],
                  [31, 8, 4, 2, 1,17,14],
                  [14,17, 1, 2, 4, 2,31],
                  [ 2, 2,31,18,10, 6, 2],
                  [14,17, 1, 1,30,16,31],
                  [14,17,17,30,16, 8, 6],
                  [ 8, 8, 8, 4, 2, 1,31],
                  [14,17,17,14,17,17,14],
                  [12, 2, 1,15,17,17,14],
                  [ 0,12,12, 0,12,12, 0],
                  [ 8, 4,12, 0,12,12, 0],
                  [ 2, 4, 8,16, 8, 4, 2],
                  [ 0, 0,31, 0,31, 0, 0],
                  [16, 8, 4, 2, 4, 8,16],
                  [ 4, 0, 4, 2, 1,17,14],
                  [14,21,21,13, 1,17,14],
                  [17,17,31,17,17,17,14],
                  [30,17,17,30,17,17,30],
                  [14,17,16,16,16,17,14],
                  [30,17,17,17,17,17,30],
                  [31,16,16,30,16,16,31],
                  [16,16,16,30,16,16,31],
                  [15,17,17,23,16,17,14],
                  [17,17,17,31,17,17,17],
                  [14, 4, 4, 4, 4, 4,14],
                  [12,18, 2, 2, 2, 2, 7],
                  [17,18,20,24,20,18,17],
                  [31,16,16,16,16,16,16],
                  [17,17,17,21,21,27,17],
                  [17,17,19,21,25,17,17],
                  [14,17,17,17,17,17,14],
                  [16,16,16,30,17,17,30],
                  [13,18,21,17,17,17,14],
                  [17,18,20,30,17,17,30],
                  [30, 1, 1,14,16,16,15],
                  [ 4, 4, 4, 4, 4, 4,31],
                  [14,17,17,17,17,17,17],
                  [ 4,10,17,17,17,17,17],
                  [10,21,21,21,17,17,17],
                  [17,17,10, 4,10,17,17],
                  [ 4, 4, 4,10,17,17,17],
                  [31,16, 8, 4, 2, 1,31],
                  [14, 8, 8, 8, 8, 8,14],
                  [ 0, 1, 2, 4, 8,16, 0],
                  [14, 2, 2, 2, 2, 2,14],
                  [ 0, 0, 0, 0,17,10, 4],
                  [31, 0, 0, 0, 0, 0, 0],
                  [ 0, 0, 0, 0, 2, 4, 8],
                  [15,17,15, 1,14, 0, 0],
                  [30,17,17,25,22,16,16],
                  [14,17,16,16,14, 0, 0],
                  [15,17,17,19,13, 1, 1],
                  [14,16,31,17,14, 0, 0],
                  [ 8, 8, 8,28, 8, 9, 6],
                  [14, 1,15,17,15, 0, 0],
                  [17,17,17,25,22,16,16],
                  [14, 4, 4, 4,12, 0, 4],
                  [12,18, 2, 2, 2, 6, 2],
                  [18,20,24,20,18,16,16],
                  [14, 4, 4, 4, 4, 4,12],
                  [17,17,21,21,26, 0, 0],
                  [17,17,17,25,22, 0, 0],
                  [14,17,17,17,14, 0, 0],
                  [16,16,30,17,30, 0, 0],
                  [ 1, 1,15,19,13, 0, 0],
                  [16,16,16,25,22, 0, 0],
                  [30, 1,14,16,15, 0, 0],
                  [ 6, 9, 8, 8,28, 8, 8],
                  [13,19,17,17,17, 0, 0],
                  [ 4,10,17,17,17, 0, 0],
                  [10,21,21,17,17, 0, 0],
                  [17,10, 4,10,17, 0, 0],
                  [14, 1,15,17,17, 0, 0],
                  [31, 8, 4, 2,31, 0, 0],
                  [ 2, 4, 4, 8, 4, 4, 2],
                  [ 4, 4, 4, 4, 4, 4, 4],
                  [ 8, 4, 4, 2, 4, 4, 8] ];

	//Binary decode table
	dec_table = [ "00000", "00001", "00010", "00011", "00100", "00101",
  	            "00110", "00111", "01000", "01001", "01010", "01011",
  	            "01100", "01101", "01110", "01111", "10000", "10001",
  	            "10010", "10011", "10100", "10101", "10110", "10111",
	            "11000", "11001", "11010", "11011", "11100", "11101",
	            "11110", "11111" ];

	//Process string one character at a time
	for(itext = [0:len(text)-1]) {
		//Convert character to index
		assign(ichar = search(text[itext],chars,1)[0]) {
			//Decode character - rows
			for(irow = [0:6]) {
				assign(val = dec_table[char_table[ichar][irow]]) {
					//Decode character - cols
					for(icol = [0:4]) {
						assign(bit = search(val[icol],"01",1)[0]) {
							if(bit) {
								//Output cube
								translate([icol + (6*itext), irow, 0])
									cube([1.0001,1.0001,1]);
							}
						}
					}
				}
			}
		}
	}
}


holder();
